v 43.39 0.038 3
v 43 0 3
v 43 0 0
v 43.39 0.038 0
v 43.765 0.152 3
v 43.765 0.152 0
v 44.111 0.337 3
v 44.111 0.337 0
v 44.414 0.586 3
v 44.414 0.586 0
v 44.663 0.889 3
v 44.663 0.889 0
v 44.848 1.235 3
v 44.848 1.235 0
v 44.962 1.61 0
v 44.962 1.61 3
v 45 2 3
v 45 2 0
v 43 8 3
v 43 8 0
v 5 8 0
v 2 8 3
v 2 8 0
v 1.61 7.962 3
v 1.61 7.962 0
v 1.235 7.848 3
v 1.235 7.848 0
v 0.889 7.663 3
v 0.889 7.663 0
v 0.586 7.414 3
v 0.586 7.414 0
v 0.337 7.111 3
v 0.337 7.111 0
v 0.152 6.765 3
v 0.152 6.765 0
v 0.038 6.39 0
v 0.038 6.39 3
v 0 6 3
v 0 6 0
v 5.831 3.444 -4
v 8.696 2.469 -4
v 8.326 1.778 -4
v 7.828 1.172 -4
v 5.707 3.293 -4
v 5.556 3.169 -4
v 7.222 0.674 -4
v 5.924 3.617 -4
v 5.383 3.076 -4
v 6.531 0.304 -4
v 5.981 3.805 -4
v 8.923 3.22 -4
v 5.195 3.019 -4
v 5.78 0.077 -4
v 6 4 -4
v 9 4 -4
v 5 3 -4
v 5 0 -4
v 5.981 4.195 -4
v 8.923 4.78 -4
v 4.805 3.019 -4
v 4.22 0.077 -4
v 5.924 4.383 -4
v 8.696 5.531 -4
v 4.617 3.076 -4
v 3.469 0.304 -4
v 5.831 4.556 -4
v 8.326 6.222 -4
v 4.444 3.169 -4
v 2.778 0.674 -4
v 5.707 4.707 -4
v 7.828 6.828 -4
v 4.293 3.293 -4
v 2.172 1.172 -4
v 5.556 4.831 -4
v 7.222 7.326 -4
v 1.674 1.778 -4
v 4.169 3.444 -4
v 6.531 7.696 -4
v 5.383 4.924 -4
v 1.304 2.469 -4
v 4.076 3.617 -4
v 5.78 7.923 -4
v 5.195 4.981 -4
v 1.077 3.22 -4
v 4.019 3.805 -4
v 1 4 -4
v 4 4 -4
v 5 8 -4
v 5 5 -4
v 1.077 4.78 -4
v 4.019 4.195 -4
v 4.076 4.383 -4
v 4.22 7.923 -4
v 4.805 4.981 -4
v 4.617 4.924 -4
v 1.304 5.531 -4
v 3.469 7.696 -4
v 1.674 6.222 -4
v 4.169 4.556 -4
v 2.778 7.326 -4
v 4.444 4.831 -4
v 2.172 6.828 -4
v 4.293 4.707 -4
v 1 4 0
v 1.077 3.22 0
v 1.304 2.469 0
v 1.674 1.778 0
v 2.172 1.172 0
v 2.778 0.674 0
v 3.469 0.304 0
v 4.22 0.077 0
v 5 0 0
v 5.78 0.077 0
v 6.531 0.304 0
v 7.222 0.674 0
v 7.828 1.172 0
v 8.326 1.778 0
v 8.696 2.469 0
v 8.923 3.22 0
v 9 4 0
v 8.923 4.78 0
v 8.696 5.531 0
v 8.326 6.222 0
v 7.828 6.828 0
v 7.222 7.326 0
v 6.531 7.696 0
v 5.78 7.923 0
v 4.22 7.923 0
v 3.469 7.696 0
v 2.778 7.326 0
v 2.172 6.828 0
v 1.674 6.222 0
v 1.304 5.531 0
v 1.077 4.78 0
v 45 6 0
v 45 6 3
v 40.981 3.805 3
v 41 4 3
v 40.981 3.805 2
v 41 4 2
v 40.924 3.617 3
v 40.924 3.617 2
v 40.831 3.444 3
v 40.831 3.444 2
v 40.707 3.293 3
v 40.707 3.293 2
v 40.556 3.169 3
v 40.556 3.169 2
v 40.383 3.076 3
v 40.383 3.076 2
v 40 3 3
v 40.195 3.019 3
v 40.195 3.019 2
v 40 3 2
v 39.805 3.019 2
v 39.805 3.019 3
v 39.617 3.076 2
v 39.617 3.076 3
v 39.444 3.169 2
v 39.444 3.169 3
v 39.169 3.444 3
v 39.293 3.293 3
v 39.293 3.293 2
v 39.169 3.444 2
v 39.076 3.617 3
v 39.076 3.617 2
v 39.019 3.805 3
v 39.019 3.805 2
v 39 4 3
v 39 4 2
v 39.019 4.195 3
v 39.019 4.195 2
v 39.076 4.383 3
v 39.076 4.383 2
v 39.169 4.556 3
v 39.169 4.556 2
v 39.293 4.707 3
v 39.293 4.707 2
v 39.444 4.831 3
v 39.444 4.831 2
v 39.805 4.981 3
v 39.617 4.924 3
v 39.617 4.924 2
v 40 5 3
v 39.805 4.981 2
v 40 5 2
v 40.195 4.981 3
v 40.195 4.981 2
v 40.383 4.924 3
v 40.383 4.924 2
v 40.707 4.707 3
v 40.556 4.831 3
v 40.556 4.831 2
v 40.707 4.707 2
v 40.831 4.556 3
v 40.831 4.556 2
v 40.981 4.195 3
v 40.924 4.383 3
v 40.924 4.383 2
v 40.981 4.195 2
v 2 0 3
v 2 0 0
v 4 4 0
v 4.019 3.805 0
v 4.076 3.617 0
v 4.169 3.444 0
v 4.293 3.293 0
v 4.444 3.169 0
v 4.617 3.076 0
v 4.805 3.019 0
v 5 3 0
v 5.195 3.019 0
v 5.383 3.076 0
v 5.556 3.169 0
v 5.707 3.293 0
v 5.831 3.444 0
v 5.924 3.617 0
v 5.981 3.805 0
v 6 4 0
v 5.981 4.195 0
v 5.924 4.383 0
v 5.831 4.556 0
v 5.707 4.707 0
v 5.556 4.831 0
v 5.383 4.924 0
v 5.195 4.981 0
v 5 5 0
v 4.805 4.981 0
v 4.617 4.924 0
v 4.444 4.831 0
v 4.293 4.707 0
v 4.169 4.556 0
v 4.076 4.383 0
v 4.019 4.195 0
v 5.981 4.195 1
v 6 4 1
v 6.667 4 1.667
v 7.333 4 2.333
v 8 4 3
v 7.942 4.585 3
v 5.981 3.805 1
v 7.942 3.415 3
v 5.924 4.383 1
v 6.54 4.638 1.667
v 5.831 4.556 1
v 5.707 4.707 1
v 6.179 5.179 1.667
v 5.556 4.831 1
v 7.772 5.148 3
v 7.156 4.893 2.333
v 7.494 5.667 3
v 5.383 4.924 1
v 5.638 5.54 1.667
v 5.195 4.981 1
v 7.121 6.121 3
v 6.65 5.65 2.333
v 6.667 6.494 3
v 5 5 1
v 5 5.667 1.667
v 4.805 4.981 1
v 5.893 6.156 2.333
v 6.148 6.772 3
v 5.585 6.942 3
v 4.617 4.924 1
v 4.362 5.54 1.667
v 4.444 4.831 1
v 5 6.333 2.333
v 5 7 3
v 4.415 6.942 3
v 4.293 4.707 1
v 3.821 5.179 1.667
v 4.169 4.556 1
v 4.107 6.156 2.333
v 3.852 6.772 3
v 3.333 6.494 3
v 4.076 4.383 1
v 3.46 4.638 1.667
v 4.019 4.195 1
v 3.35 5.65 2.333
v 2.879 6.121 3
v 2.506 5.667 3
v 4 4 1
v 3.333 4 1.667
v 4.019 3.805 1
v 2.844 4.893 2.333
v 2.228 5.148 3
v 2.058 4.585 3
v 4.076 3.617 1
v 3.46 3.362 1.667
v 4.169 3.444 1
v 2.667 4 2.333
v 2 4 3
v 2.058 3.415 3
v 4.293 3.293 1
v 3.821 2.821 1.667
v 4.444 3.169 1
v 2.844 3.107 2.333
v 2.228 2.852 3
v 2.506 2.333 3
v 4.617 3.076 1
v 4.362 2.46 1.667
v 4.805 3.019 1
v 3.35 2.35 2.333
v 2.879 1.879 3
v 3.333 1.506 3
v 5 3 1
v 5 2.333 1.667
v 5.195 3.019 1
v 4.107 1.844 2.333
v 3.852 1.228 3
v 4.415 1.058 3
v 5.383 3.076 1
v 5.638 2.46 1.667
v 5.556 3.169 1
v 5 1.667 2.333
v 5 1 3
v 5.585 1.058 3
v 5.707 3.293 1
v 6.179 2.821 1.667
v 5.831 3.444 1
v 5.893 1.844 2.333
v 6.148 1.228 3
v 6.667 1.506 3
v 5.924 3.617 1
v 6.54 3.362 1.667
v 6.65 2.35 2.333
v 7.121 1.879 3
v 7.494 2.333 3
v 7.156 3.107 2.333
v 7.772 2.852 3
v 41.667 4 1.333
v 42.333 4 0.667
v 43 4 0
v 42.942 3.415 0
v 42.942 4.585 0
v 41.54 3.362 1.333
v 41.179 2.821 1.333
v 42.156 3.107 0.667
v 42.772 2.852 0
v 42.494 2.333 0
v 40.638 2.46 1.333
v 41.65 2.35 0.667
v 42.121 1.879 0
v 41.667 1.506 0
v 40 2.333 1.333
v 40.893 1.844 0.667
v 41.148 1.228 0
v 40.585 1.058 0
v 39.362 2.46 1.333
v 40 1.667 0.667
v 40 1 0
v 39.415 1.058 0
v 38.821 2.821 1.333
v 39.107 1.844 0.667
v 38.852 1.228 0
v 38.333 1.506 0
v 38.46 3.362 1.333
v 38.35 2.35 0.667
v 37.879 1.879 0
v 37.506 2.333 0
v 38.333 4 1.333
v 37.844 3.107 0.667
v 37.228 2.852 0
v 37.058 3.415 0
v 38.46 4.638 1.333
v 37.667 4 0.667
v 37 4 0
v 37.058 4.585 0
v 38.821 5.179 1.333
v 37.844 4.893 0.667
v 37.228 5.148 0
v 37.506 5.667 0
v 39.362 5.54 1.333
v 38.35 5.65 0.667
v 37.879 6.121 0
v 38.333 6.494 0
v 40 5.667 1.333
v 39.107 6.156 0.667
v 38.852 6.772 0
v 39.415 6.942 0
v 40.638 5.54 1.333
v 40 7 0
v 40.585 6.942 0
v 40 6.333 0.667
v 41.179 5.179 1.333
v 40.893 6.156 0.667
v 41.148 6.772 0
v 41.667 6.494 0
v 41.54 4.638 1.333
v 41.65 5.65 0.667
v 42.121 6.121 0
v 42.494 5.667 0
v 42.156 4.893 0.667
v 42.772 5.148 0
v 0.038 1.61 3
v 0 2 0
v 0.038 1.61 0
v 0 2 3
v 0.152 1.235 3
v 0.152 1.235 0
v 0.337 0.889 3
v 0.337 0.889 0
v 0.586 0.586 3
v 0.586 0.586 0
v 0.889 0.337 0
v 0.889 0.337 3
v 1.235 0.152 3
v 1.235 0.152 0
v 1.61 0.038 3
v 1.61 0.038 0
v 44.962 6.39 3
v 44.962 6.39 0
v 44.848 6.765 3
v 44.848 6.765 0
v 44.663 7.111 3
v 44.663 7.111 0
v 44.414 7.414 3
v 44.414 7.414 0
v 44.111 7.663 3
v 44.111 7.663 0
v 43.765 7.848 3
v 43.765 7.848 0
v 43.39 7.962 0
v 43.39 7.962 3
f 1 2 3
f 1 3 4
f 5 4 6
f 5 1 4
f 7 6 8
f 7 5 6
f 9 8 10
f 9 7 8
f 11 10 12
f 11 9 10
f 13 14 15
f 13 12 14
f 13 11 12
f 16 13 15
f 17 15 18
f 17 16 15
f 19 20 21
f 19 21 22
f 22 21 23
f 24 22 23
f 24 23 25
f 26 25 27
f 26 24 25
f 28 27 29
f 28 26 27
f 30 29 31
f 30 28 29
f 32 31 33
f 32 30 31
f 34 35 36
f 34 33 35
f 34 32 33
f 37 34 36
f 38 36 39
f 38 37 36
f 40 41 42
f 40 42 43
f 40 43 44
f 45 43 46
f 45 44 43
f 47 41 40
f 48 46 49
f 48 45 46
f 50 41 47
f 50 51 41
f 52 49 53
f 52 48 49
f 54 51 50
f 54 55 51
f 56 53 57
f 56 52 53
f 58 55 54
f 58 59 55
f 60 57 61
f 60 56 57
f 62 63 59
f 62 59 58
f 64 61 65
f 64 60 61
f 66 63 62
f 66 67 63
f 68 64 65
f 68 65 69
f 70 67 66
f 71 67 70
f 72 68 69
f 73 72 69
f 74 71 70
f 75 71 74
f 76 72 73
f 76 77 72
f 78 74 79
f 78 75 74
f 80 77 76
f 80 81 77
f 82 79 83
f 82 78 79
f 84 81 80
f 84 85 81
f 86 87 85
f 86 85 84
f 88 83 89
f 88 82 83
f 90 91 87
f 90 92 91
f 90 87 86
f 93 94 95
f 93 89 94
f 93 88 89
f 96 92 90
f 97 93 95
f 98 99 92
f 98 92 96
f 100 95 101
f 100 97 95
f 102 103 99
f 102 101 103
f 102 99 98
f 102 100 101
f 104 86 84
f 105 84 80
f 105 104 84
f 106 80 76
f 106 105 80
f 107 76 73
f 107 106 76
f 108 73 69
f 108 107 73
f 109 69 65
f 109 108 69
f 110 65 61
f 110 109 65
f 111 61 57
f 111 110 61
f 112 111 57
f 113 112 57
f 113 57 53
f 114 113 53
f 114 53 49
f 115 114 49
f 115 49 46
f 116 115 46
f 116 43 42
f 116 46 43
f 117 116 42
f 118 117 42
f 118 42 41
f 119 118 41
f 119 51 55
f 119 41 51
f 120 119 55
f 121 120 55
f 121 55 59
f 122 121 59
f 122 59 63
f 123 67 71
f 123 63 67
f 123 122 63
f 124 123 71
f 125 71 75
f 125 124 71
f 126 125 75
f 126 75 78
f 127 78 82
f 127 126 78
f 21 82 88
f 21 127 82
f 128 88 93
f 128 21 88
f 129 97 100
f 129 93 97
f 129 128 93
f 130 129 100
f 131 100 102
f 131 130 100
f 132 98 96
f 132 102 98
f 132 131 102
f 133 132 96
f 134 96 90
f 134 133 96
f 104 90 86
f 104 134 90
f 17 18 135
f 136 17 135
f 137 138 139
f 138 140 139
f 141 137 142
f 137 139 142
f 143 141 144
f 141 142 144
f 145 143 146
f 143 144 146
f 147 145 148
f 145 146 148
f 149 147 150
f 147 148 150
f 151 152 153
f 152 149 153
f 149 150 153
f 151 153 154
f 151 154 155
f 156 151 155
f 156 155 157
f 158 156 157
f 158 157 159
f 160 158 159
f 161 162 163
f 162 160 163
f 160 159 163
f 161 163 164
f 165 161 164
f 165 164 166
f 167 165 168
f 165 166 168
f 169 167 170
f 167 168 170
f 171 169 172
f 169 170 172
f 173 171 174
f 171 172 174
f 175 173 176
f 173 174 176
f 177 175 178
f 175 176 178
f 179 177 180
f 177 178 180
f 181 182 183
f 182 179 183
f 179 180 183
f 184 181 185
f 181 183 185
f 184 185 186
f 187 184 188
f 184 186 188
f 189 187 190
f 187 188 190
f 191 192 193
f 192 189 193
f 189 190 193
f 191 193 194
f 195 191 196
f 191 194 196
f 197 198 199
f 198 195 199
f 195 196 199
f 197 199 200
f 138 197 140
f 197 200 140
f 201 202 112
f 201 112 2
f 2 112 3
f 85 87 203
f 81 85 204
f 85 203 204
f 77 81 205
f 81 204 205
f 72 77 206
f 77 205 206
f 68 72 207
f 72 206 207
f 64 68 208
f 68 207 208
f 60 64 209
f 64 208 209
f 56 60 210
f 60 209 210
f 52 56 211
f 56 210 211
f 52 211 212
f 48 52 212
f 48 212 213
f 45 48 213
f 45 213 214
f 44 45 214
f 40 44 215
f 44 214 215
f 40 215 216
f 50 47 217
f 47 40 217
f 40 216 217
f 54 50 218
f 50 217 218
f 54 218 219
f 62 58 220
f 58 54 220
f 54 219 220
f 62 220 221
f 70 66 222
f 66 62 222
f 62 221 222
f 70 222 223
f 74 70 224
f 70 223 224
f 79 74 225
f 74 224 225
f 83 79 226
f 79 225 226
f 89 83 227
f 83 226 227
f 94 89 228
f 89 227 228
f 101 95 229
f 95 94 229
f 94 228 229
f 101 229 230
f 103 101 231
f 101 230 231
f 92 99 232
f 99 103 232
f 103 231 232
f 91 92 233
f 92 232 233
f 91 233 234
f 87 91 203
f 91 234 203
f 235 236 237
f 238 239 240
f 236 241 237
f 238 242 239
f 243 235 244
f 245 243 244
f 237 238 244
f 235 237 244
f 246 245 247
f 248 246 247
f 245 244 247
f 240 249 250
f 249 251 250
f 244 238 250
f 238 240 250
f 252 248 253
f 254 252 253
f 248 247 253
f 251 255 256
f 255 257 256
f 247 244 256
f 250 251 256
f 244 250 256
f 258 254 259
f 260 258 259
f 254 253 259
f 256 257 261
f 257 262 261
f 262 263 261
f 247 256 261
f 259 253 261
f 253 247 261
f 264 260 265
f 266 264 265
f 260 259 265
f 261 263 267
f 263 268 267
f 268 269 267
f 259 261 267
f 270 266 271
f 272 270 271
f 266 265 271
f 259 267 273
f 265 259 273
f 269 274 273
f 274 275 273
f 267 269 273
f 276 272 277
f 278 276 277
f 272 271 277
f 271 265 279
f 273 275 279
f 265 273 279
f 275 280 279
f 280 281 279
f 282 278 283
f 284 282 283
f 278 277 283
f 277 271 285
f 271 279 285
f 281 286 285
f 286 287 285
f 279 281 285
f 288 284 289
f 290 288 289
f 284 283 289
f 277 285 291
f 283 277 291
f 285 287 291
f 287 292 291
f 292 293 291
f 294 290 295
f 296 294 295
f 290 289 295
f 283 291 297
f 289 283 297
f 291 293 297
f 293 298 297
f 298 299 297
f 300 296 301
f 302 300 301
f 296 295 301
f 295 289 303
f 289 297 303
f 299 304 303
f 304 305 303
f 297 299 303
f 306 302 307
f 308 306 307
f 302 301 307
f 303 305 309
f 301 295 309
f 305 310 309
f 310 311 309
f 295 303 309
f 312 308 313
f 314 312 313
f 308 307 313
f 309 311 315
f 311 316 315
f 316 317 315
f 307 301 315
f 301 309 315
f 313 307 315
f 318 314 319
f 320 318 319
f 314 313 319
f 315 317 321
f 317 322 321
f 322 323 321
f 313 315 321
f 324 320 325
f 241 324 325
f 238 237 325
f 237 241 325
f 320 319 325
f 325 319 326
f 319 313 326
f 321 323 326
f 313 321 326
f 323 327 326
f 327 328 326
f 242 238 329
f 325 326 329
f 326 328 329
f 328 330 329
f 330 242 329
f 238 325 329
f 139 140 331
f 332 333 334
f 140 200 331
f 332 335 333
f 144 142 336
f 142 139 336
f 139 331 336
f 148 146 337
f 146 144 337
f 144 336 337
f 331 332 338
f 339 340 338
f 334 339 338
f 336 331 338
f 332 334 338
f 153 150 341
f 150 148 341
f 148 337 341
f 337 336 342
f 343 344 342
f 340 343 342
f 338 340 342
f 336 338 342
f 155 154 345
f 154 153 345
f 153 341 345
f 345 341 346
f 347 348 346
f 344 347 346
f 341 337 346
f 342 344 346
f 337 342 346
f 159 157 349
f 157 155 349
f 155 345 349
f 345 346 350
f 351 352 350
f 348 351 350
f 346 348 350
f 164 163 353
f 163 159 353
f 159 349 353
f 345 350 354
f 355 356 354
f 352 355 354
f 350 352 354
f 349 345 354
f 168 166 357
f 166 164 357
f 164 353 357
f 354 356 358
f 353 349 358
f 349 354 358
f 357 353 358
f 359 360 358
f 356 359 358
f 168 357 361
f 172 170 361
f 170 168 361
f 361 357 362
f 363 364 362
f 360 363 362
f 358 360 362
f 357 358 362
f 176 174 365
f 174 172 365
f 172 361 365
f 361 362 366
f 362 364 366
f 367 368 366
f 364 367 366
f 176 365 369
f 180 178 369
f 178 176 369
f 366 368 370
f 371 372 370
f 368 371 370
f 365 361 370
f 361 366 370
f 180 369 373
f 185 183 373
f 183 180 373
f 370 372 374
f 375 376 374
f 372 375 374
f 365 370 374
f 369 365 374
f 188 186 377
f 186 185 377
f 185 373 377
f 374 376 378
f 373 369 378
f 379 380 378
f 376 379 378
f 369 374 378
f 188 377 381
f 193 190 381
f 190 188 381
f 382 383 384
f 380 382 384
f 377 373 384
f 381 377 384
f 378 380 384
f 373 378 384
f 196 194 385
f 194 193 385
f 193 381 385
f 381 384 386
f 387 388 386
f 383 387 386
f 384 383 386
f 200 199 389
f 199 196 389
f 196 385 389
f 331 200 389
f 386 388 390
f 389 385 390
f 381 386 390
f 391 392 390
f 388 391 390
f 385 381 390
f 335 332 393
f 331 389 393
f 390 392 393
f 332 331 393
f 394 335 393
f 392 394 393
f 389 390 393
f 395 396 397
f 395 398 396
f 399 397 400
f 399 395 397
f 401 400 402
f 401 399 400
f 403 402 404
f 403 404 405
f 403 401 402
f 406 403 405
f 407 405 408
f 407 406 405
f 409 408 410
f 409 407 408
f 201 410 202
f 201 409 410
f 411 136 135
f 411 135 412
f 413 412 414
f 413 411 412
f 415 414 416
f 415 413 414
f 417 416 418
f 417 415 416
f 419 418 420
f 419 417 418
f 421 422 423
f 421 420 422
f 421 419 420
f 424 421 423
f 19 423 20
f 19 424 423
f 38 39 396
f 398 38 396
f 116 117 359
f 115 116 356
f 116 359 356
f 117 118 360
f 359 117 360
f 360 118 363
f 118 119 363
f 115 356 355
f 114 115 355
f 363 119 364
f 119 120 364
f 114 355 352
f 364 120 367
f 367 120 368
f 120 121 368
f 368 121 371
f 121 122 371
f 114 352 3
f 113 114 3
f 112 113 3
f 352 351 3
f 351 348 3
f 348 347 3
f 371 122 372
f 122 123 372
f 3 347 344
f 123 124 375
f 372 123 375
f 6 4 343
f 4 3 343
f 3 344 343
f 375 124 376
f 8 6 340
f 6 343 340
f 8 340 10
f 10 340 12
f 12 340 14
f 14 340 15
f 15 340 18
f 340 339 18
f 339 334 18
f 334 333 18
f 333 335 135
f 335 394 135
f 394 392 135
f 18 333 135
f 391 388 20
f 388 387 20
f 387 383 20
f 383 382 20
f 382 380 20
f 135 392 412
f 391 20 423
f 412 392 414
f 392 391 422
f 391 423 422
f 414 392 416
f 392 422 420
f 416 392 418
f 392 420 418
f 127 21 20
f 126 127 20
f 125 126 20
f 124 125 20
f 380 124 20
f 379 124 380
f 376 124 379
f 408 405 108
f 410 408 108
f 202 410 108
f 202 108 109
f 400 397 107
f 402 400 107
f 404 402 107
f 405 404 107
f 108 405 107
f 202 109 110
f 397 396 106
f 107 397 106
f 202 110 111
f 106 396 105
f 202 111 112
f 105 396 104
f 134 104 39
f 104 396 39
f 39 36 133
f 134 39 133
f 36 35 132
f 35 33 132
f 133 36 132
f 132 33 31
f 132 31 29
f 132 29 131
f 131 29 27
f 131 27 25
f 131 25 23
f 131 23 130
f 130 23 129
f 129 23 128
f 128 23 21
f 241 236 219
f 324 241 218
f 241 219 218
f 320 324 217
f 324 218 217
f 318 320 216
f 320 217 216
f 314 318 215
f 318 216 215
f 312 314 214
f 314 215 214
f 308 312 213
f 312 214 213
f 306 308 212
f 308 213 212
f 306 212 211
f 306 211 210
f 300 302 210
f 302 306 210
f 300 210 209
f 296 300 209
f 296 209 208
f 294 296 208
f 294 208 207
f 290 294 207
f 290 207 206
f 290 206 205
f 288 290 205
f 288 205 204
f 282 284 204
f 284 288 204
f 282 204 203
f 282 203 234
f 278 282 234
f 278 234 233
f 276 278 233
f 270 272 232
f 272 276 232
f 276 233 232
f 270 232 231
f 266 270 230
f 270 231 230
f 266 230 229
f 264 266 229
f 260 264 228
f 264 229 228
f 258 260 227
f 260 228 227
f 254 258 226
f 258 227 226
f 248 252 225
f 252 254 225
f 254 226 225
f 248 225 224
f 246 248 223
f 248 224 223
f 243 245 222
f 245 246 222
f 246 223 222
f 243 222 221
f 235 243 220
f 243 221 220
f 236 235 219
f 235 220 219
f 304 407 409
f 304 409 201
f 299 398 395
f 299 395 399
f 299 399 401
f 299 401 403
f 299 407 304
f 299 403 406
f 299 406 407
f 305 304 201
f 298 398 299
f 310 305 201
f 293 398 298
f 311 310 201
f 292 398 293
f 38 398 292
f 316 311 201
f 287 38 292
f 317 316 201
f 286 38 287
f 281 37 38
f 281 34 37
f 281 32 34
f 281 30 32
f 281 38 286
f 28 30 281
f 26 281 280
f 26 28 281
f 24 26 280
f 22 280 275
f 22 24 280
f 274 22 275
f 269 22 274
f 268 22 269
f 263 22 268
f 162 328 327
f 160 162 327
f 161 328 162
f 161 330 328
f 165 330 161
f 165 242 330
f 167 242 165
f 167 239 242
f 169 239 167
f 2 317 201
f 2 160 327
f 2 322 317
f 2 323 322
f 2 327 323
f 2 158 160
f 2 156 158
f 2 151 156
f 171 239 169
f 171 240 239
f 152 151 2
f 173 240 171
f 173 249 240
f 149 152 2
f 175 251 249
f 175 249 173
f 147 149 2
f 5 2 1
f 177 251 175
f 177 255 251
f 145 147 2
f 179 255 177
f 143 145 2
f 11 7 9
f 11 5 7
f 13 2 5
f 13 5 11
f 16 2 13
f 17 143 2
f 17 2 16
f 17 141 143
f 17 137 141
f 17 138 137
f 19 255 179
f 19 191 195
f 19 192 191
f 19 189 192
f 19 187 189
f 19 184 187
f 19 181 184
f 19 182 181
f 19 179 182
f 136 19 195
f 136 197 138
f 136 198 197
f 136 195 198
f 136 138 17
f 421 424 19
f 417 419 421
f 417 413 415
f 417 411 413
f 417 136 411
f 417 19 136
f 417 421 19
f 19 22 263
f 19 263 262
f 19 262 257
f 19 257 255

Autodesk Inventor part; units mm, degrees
ref_plane "YZ Plane" through (0, 0, 0) normal (1, 0, 0) x (0, 1, 0)
ref_plane "XZ Plane" through (0, 0, 0) normal (0, 1, 0) x (-1, 0, 0)
ref_plane "XY Plane" through (0, 0, 0) normal (0, 0, 1) x (1, 0, 0)
sketch "Sketch1" plane through (0, 0, 0) normal (0, 0, 1) x (1, 0, 0)
  line L0 (0, 0) -> (45, 0)
  line L1 (45, 0) -> (45, 8)
  line L2 (45, 8) -> (0, 8)
  line L3 (0, 8) -> (0, 0)
  circle A0 centre (5, 4) radius 1
  circle A1 centre (40, 4) radius 1
  point P0 (0, 4)
  dimension "d0" = 45
  dimension "d1" = 8
  dimension "d2" = 2
  dimension "d3" = 2
  dimension "d4" = 5
  dimension "d5" = 5
extrude "Extrusion1" add sketch "Sketch1" along normal blind 3
fillet "Fillet1" radius 2 4 edges at (0, 8, 1.5) (45, 8, 1.5) (45, 0, 1.5) (0, 0, 1.5)
chamfer "Chamfer1" distance 2 angle 45 2 edges at (4, 4, 3) (39, 4, 0)
sketch "Sketch2" plane through (0, 0, 0) normal (0, 0, -1) x (-1, 0, 0)
  circle A0 centre (-5, 4) radius 1 projected
  circle A1 centre (-5, 4) radius 4
  point P0 (0, 0)
  dimension "d12" = 8
extrude "Extrusion2" add sketch "Sketch2" along normal blind 4
equation "\"d5\" = d4"
properties part number "arm"
